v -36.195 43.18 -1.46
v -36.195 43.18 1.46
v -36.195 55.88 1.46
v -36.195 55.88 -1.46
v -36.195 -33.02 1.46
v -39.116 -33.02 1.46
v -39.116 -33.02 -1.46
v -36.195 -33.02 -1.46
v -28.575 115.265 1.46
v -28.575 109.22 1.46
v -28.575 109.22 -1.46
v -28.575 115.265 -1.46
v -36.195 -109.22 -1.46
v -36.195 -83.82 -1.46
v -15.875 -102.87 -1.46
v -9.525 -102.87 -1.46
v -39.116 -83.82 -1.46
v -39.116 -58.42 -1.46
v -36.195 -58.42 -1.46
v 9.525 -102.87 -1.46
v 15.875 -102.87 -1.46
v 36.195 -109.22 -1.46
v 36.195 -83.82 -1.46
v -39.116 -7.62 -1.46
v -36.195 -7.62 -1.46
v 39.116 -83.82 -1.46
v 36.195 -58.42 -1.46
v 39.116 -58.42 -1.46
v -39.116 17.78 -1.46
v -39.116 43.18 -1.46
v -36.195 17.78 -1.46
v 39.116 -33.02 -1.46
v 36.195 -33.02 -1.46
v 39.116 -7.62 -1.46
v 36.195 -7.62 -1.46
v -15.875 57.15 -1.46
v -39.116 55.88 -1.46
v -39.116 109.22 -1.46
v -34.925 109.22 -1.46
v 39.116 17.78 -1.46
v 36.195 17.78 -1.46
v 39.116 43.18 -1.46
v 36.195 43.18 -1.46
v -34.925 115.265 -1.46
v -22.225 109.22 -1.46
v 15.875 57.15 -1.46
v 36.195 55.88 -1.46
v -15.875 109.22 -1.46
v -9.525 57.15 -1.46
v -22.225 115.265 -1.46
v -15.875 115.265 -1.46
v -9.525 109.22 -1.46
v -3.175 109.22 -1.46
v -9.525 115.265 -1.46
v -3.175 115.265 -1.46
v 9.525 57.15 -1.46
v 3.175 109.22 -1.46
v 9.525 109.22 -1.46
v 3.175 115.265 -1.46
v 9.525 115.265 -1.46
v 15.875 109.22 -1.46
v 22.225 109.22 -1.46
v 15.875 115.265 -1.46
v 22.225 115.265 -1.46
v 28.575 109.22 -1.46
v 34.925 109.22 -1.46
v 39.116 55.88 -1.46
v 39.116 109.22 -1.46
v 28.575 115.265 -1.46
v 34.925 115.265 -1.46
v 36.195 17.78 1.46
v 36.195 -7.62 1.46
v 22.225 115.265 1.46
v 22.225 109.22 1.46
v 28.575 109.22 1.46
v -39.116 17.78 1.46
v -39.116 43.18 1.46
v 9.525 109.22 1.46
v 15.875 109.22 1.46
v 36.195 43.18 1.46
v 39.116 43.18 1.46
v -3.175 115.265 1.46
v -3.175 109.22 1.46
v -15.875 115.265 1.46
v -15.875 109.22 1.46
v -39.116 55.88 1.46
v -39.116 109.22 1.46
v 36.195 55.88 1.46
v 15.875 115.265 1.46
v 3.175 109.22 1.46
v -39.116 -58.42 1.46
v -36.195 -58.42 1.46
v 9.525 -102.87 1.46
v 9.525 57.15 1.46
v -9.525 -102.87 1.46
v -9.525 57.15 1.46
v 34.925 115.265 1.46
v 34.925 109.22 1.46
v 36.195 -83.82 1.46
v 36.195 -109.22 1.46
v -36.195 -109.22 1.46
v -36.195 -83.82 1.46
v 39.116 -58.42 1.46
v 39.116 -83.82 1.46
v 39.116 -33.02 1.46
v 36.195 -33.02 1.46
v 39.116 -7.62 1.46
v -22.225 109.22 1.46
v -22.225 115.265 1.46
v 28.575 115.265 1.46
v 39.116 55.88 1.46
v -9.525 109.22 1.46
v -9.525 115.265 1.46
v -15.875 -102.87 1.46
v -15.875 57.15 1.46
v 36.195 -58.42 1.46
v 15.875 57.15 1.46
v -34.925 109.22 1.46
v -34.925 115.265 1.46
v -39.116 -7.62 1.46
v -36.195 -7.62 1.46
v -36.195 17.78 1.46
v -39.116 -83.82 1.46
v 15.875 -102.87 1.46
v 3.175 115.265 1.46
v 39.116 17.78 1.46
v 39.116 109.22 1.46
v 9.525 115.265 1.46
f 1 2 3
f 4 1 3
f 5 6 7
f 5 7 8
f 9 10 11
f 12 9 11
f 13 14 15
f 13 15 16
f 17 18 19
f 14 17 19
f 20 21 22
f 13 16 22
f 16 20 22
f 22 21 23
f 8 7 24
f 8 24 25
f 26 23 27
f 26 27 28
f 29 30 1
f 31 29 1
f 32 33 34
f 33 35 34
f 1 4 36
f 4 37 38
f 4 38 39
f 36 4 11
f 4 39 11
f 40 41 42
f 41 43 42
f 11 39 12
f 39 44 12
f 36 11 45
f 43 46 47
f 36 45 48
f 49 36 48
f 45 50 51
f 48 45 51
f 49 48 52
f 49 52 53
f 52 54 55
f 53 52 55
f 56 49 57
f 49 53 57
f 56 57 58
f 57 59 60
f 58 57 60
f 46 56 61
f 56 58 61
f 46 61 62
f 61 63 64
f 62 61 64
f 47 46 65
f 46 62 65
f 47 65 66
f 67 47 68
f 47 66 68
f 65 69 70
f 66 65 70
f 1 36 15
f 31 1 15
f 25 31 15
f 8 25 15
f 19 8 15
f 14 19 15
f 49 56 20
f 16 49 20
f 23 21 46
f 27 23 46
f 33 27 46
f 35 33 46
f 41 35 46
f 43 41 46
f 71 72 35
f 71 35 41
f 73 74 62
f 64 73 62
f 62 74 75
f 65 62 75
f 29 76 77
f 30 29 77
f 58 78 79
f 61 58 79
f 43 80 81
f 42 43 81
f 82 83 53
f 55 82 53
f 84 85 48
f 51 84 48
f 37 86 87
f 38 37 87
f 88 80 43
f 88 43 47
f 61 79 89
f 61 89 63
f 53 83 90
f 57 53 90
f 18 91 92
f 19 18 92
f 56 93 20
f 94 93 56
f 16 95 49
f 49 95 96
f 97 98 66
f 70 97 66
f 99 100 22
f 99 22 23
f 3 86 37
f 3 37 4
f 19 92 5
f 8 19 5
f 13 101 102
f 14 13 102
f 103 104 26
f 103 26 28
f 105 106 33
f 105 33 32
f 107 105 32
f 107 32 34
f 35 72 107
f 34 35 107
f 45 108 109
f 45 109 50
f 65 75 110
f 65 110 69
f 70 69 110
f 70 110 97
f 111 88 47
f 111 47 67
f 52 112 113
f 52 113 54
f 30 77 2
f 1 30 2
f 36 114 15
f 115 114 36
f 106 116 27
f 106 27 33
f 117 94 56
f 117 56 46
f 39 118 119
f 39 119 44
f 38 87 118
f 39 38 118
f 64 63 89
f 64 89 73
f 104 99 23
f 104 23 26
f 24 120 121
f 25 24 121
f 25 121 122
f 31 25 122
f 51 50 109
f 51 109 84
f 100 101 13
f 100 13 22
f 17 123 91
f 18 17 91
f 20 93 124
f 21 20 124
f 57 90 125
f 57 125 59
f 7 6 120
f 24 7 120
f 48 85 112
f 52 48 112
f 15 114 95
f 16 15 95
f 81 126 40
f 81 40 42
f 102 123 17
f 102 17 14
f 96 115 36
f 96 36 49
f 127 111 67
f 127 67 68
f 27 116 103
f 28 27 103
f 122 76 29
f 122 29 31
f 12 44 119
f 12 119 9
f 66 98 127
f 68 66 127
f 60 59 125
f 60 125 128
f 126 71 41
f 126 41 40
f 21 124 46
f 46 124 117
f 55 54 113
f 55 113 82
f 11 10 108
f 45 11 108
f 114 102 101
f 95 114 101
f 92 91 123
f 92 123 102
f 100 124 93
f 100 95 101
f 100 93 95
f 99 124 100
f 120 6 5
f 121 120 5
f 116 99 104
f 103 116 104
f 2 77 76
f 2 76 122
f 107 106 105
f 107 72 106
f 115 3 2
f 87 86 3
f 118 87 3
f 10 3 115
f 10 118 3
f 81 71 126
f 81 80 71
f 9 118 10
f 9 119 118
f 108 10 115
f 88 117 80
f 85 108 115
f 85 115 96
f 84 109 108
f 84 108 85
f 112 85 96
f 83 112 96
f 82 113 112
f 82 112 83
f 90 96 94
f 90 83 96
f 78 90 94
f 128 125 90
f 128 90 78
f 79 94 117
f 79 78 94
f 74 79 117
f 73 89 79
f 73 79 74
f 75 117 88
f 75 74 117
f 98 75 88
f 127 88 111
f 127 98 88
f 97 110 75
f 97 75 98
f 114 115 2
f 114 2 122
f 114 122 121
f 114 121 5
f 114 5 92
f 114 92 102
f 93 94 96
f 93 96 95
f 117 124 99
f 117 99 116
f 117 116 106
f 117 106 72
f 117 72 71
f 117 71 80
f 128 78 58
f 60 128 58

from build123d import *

# Parameters (mm, degrees)
SKETCH1_W           = 78.232
SKETCH1_H           = 218.44
BOSS_EXTRUDE1_DEPTH = 1.4605
SKETCH2_W           = 2.921
SKETCH2_H           = 25.4
SKETCH2_H_2         = 12.7
CUT_EXTRUDE1_DEPTH  = 2.921
SKETCH3_W           = 6.35
SKETCH3_H           = 2.921
BOSS_EXTRUDE2_DEPTH = 6.0452
SKETCH5_W           = 6.35
SKETCH5_H           = 160.02
CUT_EXTRUDE2_DEPTH  = 122.756560513


with BuildPart() as part:
    # Sketch1 → Boss-Extrude1 (new, symmetric)
    with BuildSketch(Plane.XY):
        Rectangle(SKETCH1_W, SKETCH1_H)
    extrude(amount=BOSS_EXTRUDE1_DEPTH, both=True)

    # Sketch2 → Cut-Extrude1 (cut)
    with BuildSketch(Plane.XY.offset(1.4605)):
        with Locations((-37.6555, -96.52)):
            Rectangle(SKETCH2_W, SKETCH2_H)
        with Locations((-37.6555, -45.72)):
            Rectangle(SKETCH2_W, SKETCH2_H)
        with Locations((-37.6555, 5.08)):
            Rectangle(SKETCH2_W, SKETCH2_H)
        with Locations((-37.6555, 49.53)):
            Rectangle(SKETCH2_W, SKETCH2_H_2)
        with Locations((37.6555, 49.53)):
            Rectangle(SKETCH2_W, SKETCH2_H_2)
        with Locations((37.6555, 5.08)):
            Rectangle(SKETCH2_W, SKETCH2_H)
        with Locations((37.6555, -96.52)):
            Rectangle(SKETCH2_W, SKETCH2_H)
        with Locations((37.6555, -45.72)):
            Rectangle(SKETCH2_W, SKETCH2_H)
    extrude(amount=-CUT_EXTRUDE1_DEPTH, mode=Mode.SUBTRACT)

    # Sketch3 → Boss-Extrude2 (add)
    with BuildSketch(Plane(origin=(0, 109.22, 0), x_dir=(1, 0, 0), z_dir=(0, 1, 0))):
        with Locations((31.75, 0)):
            Rectangle(SKETCH3_W, SKETCH3_H)
        with Locations((19.05, 0)):
            Rectangle(SKETCH3_W, SKETCH3_H)
        with Locations((6.35, 0)):
            Rectangle(SKETCH3_W, SKETCH3_H)
        with Locations((-6.35, 0)):
            Rectangle(SKETCH3_W, SKETCH3_H)
        with Locations((-19.05, 0)):
            Rectangle(SKETCH3_W, SKETCH3_H)
        with Locations((-31.75, 0)):
            Rectangle(SKETCH3_W, SKETCH3_H)
    extrude(amount=BOSS_EXTRUDE2_DEPTH)

    # Sketch5 → Cut-Extrude2 (cut, through all)
    with BuildSketch(Plane.XY.offset(1.4605)):
        with Locations((-12.7, -22.86)):
            Rectangle(SKETCH5_W, SKETCH5_H)
        with Locations((12.7, -22.86)):
            Rectangle(SKETCH5_W, SKETCH5_H)
    extrude(amount=-CUT_EXTRUDE2_DEPTH, mode=Mode.SUBTRACT)


solid = part.part
